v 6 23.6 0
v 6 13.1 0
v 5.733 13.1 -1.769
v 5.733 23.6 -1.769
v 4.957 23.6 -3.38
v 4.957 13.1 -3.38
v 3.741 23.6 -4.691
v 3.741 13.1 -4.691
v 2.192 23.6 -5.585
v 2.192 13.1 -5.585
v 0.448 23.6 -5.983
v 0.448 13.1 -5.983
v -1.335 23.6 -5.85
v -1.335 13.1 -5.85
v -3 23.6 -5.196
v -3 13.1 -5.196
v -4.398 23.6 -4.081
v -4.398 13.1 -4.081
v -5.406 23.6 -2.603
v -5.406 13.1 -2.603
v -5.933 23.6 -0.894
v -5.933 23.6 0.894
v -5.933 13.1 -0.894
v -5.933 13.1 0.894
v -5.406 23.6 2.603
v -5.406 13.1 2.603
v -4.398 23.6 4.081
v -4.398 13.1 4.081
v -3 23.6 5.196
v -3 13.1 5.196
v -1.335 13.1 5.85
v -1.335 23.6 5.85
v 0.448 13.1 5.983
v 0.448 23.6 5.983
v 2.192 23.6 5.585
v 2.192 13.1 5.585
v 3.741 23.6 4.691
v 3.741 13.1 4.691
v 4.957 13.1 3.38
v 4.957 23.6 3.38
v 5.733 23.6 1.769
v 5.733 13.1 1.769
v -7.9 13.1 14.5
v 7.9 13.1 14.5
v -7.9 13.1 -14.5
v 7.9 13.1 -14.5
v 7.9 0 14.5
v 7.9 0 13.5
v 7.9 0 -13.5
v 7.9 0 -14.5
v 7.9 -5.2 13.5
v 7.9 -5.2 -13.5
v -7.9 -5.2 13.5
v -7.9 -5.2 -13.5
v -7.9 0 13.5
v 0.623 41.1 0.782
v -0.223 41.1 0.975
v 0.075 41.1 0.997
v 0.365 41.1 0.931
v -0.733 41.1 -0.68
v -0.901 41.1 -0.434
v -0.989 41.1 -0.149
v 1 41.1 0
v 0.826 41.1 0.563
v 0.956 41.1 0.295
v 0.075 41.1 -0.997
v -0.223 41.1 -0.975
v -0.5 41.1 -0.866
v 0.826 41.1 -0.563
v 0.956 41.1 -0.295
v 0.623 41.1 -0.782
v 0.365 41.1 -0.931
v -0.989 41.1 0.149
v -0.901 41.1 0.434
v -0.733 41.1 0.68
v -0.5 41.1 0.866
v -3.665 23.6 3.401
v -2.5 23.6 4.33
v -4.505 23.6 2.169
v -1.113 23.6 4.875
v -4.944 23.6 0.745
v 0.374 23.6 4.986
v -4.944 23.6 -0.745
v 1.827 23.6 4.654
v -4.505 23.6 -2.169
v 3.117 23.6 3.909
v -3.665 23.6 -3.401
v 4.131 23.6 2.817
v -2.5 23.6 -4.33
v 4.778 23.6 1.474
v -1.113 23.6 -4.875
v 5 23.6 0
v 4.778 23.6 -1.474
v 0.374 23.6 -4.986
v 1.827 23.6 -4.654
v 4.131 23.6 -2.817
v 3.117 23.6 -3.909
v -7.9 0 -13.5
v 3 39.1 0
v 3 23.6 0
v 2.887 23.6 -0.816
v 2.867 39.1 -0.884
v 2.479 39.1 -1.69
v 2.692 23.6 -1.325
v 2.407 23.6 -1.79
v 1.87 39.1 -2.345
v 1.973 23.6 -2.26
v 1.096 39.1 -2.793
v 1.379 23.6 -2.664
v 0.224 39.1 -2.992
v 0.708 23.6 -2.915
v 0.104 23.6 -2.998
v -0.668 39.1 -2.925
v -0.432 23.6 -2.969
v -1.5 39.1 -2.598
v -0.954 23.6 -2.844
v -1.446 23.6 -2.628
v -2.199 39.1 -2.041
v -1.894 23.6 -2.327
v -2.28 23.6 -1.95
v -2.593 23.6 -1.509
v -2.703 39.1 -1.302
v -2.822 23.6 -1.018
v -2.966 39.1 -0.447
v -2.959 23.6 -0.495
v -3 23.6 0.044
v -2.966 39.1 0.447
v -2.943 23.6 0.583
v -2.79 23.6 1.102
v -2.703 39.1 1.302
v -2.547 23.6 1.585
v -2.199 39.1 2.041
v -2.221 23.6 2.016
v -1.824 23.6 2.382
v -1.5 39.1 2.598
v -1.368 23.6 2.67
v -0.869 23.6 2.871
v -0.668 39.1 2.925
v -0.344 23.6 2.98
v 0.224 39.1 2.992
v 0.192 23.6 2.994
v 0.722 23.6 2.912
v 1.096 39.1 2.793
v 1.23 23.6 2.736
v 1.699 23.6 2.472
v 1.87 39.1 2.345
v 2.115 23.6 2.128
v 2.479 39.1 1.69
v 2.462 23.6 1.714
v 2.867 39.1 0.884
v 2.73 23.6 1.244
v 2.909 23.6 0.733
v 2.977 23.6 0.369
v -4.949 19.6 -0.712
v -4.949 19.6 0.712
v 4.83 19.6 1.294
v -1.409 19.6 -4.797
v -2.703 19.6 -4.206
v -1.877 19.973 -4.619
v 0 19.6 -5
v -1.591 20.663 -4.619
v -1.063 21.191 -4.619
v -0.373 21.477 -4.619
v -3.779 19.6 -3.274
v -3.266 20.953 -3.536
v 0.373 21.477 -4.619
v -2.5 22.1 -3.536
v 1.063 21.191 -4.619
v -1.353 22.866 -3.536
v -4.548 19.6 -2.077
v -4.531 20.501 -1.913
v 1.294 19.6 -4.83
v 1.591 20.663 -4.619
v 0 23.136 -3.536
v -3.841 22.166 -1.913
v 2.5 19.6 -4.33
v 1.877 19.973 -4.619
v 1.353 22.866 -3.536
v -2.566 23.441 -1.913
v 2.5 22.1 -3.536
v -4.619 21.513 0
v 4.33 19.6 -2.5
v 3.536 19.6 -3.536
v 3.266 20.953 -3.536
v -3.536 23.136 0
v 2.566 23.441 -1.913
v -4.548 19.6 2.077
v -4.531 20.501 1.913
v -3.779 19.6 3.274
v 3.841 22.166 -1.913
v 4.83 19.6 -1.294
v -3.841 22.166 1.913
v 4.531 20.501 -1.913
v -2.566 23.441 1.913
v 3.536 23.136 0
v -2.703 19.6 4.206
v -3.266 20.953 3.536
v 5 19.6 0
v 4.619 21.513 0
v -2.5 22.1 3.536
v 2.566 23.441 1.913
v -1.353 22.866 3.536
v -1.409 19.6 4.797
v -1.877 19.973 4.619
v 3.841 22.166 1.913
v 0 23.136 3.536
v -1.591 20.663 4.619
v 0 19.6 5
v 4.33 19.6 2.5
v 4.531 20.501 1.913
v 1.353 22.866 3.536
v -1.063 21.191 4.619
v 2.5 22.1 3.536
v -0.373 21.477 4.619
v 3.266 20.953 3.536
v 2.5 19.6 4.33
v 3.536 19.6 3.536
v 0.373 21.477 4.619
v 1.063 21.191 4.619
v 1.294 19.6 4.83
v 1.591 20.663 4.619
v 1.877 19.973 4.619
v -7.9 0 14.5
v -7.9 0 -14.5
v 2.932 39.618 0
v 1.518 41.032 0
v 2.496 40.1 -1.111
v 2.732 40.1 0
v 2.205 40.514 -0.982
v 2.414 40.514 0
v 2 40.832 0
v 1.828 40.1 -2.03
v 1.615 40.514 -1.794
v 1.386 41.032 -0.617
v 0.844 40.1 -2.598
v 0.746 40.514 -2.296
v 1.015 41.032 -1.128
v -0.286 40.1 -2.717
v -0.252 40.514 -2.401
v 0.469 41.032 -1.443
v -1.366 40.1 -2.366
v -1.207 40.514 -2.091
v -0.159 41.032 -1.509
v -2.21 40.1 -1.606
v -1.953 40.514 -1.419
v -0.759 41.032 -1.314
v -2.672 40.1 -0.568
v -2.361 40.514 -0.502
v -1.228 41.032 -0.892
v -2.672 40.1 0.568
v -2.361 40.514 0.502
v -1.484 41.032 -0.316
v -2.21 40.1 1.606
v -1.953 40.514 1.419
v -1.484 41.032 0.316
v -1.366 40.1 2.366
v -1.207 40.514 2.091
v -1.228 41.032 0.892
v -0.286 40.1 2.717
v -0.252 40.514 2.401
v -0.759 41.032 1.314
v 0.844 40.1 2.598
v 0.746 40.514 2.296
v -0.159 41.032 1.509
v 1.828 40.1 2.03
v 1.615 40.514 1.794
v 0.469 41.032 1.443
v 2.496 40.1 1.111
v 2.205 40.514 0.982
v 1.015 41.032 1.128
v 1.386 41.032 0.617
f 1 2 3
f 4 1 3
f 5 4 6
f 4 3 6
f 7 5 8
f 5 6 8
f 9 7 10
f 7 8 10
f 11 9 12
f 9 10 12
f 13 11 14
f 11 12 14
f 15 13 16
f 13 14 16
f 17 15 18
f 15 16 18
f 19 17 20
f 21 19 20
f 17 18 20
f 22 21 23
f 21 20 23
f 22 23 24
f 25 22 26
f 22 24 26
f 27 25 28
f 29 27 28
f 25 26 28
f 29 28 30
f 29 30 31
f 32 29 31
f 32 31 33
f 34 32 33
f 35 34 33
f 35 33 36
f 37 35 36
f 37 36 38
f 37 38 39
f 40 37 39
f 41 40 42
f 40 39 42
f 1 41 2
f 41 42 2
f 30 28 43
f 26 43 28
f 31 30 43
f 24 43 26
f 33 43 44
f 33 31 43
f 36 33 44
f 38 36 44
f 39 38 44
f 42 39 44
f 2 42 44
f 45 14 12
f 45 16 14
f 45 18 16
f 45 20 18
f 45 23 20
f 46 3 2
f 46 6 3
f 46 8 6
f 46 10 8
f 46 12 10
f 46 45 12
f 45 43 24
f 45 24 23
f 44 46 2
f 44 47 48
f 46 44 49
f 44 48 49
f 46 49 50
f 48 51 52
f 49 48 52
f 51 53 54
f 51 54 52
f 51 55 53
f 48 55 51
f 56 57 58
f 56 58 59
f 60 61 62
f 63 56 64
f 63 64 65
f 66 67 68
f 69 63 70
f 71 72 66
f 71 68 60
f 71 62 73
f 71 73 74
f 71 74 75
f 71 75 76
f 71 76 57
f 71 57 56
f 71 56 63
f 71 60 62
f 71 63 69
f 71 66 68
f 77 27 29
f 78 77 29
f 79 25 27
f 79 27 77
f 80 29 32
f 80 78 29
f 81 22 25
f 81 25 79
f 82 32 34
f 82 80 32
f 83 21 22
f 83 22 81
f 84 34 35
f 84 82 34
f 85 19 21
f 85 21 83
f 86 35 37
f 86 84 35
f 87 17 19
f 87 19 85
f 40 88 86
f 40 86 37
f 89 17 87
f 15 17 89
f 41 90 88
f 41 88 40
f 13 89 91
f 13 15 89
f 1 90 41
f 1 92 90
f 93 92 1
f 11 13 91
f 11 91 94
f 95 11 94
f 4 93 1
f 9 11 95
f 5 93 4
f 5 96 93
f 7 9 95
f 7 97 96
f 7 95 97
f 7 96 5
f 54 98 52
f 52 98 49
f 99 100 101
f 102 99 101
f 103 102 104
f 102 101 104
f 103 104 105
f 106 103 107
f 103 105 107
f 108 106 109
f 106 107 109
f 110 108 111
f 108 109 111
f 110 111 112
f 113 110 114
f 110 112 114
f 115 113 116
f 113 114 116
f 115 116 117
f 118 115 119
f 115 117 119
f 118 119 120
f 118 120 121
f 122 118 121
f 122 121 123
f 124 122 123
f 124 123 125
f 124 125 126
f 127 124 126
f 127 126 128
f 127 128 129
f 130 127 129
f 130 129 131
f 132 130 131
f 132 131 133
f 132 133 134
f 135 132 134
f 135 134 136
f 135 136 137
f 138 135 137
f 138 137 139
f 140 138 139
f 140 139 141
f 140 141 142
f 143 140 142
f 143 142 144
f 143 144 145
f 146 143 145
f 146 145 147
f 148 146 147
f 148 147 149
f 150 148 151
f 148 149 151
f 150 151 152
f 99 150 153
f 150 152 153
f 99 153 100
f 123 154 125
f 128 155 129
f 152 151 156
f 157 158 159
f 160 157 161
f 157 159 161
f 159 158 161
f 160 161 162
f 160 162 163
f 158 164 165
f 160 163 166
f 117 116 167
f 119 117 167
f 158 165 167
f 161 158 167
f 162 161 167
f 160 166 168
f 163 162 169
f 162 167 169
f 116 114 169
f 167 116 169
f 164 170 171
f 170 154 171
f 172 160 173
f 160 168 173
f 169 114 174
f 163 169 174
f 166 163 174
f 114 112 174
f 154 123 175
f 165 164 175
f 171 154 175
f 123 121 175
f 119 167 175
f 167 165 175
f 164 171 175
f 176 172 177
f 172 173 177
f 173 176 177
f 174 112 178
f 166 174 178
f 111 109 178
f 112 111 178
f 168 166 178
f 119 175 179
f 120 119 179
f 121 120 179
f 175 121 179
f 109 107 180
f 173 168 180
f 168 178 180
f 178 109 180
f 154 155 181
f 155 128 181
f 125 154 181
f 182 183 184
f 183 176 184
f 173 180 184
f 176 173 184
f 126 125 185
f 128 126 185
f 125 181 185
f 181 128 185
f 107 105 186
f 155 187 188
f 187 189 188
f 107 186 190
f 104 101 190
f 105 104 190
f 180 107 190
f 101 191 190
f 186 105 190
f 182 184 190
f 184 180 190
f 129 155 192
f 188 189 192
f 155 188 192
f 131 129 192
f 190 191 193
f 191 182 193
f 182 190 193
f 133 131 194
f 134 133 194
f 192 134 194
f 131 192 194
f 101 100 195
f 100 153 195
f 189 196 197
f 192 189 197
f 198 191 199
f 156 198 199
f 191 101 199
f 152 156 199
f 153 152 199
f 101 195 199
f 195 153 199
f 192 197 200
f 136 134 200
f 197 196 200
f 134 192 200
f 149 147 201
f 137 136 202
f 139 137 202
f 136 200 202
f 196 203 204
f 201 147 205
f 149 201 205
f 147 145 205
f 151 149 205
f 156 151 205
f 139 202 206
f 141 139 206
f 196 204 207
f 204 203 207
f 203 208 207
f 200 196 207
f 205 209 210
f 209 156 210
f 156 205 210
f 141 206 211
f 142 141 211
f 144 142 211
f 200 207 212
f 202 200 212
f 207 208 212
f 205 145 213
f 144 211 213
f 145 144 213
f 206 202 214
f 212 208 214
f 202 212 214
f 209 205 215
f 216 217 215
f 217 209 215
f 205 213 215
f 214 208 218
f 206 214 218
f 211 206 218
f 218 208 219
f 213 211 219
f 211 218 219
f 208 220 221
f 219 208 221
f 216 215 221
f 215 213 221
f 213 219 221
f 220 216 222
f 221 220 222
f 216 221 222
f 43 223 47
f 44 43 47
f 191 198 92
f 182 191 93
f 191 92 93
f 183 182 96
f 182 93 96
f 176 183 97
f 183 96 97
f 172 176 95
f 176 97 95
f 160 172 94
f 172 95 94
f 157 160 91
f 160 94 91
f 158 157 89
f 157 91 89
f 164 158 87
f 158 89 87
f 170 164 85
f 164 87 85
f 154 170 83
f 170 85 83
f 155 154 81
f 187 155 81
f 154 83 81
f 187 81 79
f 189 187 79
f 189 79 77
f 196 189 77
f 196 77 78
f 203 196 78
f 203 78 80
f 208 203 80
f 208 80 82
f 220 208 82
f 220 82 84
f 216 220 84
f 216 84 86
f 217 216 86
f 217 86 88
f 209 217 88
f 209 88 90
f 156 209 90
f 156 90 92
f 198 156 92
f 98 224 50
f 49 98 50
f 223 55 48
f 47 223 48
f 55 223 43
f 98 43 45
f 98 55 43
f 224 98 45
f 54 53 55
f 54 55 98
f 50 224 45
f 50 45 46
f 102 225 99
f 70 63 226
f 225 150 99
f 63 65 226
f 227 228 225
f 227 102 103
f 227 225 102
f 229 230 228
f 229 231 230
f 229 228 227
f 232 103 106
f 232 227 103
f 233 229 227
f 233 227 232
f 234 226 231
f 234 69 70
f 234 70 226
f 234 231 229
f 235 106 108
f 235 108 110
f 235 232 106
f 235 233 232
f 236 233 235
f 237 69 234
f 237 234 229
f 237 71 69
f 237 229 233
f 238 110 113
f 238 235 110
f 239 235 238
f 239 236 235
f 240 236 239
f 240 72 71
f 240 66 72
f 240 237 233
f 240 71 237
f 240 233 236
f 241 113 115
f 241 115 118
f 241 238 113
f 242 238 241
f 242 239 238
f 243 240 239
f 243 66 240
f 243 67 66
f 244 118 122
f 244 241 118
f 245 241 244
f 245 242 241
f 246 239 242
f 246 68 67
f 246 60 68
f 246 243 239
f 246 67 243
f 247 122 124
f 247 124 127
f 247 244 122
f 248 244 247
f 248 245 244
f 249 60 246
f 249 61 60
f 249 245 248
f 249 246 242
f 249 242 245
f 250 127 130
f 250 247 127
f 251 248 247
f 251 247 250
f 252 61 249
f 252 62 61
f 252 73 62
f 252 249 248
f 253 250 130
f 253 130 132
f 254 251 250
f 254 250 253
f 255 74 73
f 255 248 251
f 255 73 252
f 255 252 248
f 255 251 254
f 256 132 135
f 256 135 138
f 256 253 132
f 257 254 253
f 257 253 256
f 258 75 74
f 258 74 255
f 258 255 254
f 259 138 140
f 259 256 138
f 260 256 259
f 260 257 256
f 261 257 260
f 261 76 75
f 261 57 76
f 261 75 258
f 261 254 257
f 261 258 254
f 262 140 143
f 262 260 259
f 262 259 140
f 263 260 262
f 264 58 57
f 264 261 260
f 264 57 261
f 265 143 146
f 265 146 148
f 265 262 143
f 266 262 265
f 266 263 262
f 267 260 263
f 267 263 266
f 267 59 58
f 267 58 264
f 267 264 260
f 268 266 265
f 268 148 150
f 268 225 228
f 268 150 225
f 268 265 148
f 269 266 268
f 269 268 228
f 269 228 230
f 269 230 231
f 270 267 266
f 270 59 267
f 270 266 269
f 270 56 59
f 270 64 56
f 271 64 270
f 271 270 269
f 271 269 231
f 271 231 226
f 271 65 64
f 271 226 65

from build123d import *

# Parameters (mm, degrees)
SKETCH1_W           = 15.8
SKETCH1_H           = 29
BOSS_EXTRUDE1_DEPTH = 13.1
SKETCH2_R           = 6
BOSS_EXTRUDE2_DEPTH = 10.5
SKETCH4_R           = 5
CUT_EXTRUDE1_DEPTH  = 4
SKETCH5_R           = 3
BOSS_EXTRUDE3_DEPTH = 21.5
REVOLVE2_ANGLE      = 180
FILLET1_R           = 2
SKETCH6_W           = 15.8
SKETCH6_H           = 27
BOSS_EXTRUDE4_DEPTH = 5.2


with BuildPart() as part:
    # Sketch1 → Boss-Extrude1 (new body)
    with BuildSketch(Plane(origin=(0, 0, 0), x_dir=(1, 0, 0), z_dir=(0, 1, 0))):
        Rectangle(SKETCH1_W, SKETCH1_H)
    extrude(amount=BOSS_EXTRUDE1_DEPTH)

    # Sketch2 → Boss-Extrude2 (add)
    with BuildSketch(Plane(origin=(0, 13.1, 0), x_dir=(1, 0, 0), z_dir=(0, 1, 0))):
        Circle(SKETCH2_R)
    extrude(amount=BOSS_EXTRUDE2_DEPTH)

    # Sketch4 → Cut-Extrude1 (cut)
    with BuildSketch(Plane(origin=(0, 23.6, 0), x_dir=(1, 0, 0), z_dir=(0, 1, 0))):
        Circle(SKETCH4_R)
    extrude(amount=-CUT_EXTRUDE1_DEPTH, mode=Mode.SUBTRACT)

    # Sketch5 → Boss-Extrude3 (add)
    with BuildSketch(Plane(origin=(0, 19.6, 0), x_dir=(1, 0, 0), z_dir=(0, 1, 0))):
        Circle(SKETCH5_R)
    extrude(amount=BOSS_EXTRUDE3_DEPTH)

    # Sketch3 → Revolve2 (revolve)
    with BuildSketch(Plane(origin=(0, 19.6, 0), x_dir=(1, 0, 0), z_dir=(0, 1, 0))):
        with BuildLine():
            Line((0, -5), (0, 5))
            ThreePointArc((0, 5), (-5, 0), (0, -5))
        make_face()
    revolve(axis=Axis((0, 19.6, 6), (0, 0, -1)), revolution_arc=REVOLVE2_ANGLE)

    # Fillet1
    fillet1_edges = [part.edges().sort_by_distance(p)[0] for p in [
        (-3, 41.1, 0),
    ]]
    fillet(fillet1_edges, radius=FILLET1_R)

    # Sketch6 → Boss-Extrude4 (add)
    with BuildSketch(Plane.XZ):
        Rectangle(SKETCH6_W, SKETCH6_H)
    extrude(amount=BOSS_EXTRUDE4_DEPTH)


solid = part.part
